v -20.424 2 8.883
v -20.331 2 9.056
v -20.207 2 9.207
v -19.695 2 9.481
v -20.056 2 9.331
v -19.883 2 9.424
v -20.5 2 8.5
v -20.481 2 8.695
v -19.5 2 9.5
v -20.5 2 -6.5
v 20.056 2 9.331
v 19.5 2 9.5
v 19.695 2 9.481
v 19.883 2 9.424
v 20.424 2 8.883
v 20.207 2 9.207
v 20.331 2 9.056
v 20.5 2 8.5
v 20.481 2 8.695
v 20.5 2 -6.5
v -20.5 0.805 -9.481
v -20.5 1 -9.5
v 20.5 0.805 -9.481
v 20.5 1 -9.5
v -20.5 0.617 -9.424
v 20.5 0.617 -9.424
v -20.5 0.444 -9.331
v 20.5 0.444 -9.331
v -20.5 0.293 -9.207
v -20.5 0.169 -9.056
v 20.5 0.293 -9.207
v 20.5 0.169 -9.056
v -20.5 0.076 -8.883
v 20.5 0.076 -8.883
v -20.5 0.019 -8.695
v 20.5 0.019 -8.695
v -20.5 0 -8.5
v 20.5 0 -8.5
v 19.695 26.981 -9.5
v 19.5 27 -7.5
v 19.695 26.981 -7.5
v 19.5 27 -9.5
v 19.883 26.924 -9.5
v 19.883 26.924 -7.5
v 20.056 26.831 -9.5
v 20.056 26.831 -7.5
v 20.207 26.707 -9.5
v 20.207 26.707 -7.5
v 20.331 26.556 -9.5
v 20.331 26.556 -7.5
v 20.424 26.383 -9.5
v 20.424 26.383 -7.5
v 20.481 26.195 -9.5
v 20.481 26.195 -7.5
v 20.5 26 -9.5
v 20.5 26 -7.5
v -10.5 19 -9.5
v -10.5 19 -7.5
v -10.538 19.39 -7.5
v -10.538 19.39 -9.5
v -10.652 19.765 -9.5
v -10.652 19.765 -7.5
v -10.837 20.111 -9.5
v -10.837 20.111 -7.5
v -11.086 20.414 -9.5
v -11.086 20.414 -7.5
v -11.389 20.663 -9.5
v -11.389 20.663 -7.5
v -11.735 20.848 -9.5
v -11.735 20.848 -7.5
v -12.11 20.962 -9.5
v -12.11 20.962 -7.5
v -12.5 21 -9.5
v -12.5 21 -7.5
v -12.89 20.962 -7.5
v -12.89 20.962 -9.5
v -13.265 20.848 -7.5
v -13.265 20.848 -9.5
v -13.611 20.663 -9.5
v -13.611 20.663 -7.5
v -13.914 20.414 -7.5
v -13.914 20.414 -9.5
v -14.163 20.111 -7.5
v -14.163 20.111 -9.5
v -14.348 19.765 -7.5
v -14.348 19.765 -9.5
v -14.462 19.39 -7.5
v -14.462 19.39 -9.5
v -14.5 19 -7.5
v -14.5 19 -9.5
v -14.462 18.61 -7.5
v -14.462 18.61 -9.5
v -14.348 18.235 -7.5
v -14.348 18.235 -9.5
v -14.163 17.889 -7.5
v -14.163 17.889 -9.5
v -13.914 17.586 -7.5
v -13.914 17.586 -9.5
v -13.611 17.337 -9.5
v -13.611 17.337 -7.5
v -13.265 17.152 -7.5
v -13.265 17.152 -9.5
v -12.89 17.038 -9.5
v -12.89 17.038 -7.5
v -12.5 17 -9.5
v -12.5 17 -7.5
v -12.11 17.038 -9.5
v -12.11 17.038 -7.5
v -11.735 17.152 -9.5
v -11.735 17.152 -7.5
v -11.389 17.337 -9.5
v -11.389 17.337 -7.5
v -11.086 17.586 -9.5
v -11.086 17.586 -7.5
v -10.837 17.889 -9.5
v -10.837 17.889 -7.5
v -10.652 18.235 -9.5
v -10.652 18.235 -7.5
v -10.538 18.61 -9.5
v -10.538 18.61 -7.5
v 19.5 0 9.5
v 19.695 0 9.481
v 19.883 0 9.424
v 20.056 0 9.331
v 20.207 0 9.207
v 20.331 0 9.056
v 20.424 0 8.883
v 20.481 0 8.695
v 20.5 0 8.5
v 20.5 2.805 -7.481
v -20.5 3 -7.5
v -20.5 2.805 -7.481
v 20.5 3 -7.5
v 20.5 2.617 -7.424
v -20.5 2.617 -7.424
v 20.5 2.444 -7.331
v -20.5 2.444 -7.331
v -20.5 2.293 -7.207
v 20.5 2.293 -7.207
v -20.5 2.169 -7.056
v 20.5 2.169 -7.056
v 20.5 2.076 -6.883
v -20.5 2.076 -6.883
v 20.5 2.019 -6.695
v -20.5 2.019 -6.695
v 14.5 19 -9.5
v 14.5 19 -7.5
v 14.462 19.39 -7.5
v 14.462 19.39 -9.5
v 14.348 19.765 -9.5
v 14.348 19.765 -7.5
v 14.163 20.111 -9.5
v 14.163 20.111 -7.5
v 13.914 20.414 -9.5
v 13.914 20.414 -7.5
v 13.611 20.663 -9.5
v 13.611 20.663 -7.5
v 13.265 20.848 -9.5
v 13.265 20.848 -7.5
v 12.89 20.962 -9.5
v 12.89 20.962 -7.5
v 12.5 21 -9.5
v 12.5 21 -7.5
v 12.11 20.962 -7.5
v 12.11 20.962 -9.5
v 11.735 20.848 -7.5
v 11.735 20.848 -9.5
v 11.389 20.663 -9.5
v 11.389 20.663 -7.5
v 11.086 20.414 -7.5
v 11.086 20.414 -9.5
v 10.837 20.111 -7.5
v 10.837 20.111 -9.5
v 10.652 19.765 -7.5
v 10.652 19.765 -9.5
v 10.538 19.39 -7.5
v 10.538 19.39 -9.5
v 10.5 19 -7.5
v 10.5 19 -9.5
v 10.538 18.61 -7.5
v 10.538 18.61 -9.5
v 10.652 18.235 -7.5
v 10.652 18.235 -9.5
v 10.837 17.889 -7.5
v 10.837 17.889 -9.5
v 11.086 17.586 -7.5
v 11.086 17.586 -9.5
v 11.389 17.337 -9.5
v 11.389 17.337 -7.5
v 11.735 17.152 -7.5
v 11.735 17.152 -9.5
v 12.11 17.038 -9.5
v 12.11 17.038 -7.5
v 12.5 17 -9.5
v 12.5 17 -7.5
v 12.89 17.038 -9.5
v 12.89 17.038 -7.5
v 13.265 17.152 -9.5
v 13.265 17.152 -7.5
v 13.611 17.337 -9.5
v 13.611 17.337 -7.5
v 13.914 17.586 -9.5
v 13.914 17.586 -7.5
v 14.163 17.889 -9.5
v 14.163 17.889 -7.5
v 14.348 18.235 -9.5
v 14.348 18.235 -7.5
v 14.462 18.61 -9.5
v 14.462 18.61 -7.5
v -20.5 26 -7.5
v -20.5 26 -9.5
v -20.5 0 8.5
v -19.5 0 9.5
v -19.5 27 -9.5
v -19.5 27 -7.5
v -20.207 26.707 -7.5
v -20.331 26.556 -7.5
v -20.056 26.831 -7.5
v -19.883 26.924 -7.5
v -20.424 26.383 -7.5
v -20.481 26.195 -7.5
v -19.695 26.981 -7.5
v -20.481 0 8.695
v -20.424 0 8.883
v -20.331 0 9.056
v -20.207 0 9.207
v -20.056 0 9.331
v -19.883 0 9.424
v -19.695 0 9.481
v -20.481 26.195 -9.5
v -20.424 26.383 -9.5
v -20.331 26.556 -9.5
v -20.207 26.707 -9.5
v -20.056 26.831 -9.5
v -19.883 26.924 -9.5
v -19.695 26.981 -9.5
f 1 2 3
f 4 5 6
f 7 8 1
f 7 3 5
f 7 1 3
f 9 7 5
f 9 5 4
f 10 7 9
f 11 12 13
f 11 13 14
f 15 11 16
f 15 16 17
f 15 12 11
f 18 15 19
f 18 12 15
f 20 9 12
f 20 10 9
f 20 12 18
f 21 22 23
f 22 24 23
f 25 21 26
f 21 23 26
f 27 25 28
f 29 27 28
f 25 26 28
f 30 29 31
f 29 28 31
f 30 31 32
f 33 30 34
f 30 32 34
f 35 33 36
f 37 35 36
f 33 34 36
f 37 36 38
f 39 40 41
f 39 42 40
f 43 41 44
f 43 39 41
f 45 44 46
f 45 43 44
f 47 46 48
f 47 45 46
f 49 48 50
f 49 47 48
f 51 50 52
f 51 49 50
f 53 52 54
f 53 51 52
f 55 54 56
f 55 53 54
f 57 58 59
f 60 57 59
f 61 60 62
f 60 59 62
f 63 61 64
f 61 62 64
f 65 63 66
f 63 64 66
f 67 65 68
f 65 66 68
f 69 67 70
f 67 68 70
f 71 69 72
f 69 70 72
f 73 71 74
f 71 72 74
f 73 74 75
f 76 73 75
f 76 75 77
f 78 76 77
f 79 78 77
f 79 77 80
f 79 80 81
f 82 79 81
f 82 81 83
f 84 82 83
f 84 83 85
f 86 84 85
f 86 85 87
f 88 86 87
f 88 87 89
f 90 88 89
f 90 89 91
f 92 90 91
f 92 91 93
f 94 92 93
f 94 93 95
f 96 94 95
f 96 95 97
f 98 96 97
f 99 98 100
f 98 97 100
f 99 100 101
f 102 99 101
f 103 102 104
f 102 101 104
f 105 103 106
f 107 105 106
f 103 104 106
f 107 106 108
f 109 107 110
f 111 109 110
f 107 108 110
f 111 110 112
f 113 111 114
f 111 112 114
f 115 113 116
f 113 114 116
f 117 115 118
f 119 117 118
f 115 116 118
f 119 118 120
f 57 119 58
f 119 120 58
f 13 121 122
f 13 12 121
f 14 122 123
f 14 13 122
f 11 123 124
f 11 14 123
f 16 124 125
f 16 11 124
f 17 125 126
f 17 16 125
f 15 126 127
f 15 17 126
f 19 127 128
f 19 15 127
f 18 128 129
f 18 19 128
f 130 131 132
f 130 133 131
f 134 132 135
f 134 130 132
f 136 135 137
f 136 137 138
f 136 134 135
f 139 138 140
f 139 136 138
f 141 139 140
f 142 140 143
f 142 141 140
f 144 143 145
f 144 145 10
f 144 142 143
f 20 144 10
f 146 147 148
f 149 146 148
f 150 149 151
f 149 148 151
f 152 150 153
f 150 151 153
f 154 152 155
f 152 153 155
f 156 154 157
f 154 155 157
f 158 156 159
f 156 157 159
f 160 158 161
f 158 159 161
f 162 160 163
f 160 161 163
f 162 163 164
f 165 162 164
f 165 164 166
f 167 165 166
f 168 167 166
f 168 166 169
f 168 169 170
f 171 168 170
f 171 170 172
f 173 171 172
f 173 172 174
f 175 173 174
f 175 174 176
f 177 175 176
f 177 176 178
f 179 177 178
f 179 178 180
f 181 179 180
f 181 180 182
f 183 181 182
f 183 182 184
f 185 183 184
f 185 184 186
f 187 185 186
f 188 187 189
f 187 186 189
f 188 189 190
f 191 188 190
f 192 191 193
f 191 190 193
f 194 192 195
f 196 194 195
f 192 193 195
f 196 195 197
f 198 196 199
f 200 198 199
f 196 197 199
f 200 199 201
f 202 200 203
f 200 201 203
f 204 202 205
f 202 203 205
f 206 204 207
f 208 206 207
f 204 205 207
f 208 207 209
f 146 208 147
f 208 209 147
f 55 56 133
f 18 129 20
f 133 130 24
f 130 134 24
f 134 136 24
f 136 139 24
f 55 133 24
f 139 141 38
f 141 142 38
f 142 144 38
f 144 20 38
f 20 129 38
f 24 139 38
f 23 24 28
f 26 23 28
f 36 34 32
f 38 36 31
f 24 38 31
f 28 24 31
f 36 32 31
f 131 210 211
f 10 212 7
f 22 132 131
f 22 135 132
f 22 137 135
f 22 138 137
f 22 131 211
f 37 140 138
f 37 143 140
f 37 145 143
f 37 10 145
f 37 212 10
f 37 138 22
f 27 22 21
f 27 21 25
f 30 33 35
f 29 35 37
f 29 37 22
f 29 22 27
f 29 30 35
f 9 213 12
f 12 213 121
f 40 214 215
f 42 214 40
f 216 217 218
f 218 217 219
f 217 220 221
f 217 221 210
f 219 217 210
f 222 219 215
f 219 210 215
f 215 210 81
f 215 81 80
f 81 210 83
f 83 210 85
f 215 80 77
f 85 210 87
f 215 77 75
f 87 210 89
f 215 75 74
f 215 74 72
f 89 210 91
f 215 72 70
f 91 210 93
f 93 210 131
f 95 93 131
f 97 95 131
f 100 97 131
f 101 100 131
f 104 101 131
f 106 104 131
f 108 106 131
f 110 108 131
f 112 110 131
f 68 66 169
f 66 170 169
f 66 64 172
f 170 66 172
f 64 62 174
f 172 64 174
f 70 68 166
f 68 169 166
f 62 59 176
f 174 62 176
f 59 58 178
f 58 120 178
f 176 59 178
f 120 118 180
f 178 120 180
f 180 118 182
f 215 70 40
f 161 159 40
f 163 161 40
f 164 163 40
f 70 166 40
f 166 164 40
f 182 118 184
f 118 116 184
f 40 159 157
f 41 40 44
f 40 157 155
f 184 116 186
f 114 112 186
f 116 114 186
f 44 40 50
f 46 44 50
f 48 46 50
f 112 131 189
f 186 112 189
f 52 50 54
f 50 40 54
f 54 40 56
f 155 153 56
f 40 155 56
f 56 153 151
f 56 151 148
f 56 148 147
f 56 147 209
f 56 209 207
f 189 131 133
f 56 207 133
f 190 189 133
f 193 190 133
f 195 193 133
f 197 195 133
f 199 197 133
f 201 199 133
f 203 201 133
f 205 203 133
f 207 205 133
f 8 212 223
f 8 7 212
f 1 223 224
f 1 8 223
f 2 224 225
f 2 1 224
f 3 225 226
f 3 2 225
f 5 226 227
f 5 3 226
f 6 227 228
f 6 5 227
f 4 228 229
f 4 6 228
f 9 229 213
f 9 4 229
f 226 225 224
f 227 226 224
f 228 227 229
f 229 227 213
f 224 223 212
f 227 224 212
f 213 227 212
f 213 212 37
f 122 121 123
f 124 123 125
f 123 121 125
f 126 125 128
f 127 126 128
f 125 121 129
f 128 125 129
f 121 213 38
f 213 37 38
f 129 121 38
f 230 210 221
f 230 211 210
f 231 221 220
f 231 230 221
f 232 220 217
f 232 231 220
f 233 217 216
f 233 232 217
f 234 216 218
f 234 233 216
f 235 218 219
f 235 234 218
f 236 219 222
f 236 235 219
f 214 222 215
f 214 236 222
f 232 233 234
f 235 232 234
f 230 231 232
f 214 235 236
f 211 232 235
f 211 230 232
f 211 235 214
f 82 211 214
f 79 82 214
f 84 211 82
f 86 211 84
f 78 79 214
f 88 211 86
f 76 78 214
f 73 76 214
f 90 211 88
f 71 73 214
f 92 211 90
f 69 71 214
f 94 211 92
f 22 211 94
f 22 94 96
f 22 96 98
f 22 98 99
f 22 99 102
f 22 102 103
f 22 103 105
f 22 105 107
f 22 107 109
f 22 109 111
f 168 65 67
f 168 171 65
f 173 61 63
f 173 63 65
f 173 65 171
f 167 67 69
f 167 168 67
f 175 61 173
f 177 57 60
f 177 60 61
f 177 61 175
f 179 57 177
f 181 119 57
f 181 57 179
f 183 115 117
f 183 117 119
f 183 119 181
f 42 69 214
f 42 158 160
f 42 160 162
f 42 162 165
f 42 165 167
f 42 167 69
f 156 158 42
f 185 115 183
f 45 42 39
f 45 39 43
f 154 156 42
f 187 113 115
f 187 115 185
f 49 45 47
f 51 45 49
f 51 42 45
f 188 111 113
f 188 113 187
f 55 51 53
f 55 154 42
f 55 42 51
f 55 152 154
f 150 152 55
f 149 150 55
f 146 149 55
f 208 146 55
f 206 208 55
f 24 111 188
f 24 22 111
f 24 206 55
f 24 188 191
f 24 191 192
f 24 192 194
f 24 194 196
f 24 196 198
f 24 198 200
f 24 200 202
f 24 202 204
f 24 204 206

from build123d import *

# Parameters (mm, degrees)
SKETCH_1_W          = 41
SKETCH_1_H          = 19
EXTRUDE_2_DEPTH     = 2
SKETCH_2_W          = 41
SKETCH_2_H          = 2
EXTRUDE_3_DEPTH     = 25
SKETCH_3_R          = 2
CUT_EXTRUDE_1_DEPTH = 25
FILLET_1_R          = 1
FILLET_2_R          = 1
FILLET_3_R          = 1
FILLET_4_R          = 1
FILLET_5_R          = 1
FILLET_6_R          = 1


with BuildPart() as part:
    # 草图1 → 凸台-拉伸2 (new body)
    with BuildSketch(Plane(origin=(0, 0, 0), x_dir=(1, 0, 0), z_dir=(0, 1, 0))):
        Rectangle(SKETCH_1_W, SKETCH_1_H)
    extrude(amount=EXTRUDE_2_DEPTH)

    # 草图2 → 凸台-拉伸3 (add)
    with BuildSketch(Plane(origin=(0, 2, 0), x_dir=(1, 0, 0), z_dir=(0, 1, 0))):
        with Locations((0, 8.5)):
            Rectangle(SKETCH_2_W, SKETCH_2_H)
    extrude(amount=EXTRUDE_3_DEPTH)

    # 草图3 → 切除-拉伸1 (cut)
    with BuildSketch(Plane.XY.offset(-7.5)):
        with Locations((-12.5, 19)):
            Circle(SKETCH_3_R)
        with Locations((12.5, 19)):
            Circle(SKETCH_3_R)
    extrude(amount=-CUT_EXTRUDE_1_DEPTH, mode=Mode.SUBTRACT)

    # 圆角1
    fillet_1_edges = [part.edges().sort_by_distance(p)[0] for p in [
        (0, 2, -7.5),
    ]]
    fillet(fillet_1_edges, radius=FILLET_1_R)

    # 圆角2
    fillet_2_edges = [part.edges().sort_by_distance(p)[0] for p in [
        (0, 0, -9.5),
    ]]
    fillet(fillet_2_edges, radius=FILLET_2_R)

    # 圆角3
    fillet_3_edges = [part.edges().sort_by_distance(p)[0] for p in [
        (-20.5, 1, 9.5),
    ]]
    fillet(fillet_3_edges, radius=FILLET_3_R)

    # 圆角4
    fillet_4_edges = [part.edges().sort_by_distance(p)[0] for p in [
        (20.5, 1, 9.5),
    ]]
    fillet(fillet_4_edges, radius=FILLET_4_R)

    # 圆角5
    fillet_5_edges = [part.edges().sort_by_distance(p)[0] for p in [
        (-20.5, 27, -8.5),
    ]]
    fillet(fillet_5_edges, radius=FILLET_5_R)

    # 圆角6
    fillet_6_edges = [part.edges().sort_by_distance(p)[0] for p in [
        (20.5, 27, -8.5),
    ]]
    fillet(fillet_6_edges, radius=FILLET_6_R)


solid = part.part
